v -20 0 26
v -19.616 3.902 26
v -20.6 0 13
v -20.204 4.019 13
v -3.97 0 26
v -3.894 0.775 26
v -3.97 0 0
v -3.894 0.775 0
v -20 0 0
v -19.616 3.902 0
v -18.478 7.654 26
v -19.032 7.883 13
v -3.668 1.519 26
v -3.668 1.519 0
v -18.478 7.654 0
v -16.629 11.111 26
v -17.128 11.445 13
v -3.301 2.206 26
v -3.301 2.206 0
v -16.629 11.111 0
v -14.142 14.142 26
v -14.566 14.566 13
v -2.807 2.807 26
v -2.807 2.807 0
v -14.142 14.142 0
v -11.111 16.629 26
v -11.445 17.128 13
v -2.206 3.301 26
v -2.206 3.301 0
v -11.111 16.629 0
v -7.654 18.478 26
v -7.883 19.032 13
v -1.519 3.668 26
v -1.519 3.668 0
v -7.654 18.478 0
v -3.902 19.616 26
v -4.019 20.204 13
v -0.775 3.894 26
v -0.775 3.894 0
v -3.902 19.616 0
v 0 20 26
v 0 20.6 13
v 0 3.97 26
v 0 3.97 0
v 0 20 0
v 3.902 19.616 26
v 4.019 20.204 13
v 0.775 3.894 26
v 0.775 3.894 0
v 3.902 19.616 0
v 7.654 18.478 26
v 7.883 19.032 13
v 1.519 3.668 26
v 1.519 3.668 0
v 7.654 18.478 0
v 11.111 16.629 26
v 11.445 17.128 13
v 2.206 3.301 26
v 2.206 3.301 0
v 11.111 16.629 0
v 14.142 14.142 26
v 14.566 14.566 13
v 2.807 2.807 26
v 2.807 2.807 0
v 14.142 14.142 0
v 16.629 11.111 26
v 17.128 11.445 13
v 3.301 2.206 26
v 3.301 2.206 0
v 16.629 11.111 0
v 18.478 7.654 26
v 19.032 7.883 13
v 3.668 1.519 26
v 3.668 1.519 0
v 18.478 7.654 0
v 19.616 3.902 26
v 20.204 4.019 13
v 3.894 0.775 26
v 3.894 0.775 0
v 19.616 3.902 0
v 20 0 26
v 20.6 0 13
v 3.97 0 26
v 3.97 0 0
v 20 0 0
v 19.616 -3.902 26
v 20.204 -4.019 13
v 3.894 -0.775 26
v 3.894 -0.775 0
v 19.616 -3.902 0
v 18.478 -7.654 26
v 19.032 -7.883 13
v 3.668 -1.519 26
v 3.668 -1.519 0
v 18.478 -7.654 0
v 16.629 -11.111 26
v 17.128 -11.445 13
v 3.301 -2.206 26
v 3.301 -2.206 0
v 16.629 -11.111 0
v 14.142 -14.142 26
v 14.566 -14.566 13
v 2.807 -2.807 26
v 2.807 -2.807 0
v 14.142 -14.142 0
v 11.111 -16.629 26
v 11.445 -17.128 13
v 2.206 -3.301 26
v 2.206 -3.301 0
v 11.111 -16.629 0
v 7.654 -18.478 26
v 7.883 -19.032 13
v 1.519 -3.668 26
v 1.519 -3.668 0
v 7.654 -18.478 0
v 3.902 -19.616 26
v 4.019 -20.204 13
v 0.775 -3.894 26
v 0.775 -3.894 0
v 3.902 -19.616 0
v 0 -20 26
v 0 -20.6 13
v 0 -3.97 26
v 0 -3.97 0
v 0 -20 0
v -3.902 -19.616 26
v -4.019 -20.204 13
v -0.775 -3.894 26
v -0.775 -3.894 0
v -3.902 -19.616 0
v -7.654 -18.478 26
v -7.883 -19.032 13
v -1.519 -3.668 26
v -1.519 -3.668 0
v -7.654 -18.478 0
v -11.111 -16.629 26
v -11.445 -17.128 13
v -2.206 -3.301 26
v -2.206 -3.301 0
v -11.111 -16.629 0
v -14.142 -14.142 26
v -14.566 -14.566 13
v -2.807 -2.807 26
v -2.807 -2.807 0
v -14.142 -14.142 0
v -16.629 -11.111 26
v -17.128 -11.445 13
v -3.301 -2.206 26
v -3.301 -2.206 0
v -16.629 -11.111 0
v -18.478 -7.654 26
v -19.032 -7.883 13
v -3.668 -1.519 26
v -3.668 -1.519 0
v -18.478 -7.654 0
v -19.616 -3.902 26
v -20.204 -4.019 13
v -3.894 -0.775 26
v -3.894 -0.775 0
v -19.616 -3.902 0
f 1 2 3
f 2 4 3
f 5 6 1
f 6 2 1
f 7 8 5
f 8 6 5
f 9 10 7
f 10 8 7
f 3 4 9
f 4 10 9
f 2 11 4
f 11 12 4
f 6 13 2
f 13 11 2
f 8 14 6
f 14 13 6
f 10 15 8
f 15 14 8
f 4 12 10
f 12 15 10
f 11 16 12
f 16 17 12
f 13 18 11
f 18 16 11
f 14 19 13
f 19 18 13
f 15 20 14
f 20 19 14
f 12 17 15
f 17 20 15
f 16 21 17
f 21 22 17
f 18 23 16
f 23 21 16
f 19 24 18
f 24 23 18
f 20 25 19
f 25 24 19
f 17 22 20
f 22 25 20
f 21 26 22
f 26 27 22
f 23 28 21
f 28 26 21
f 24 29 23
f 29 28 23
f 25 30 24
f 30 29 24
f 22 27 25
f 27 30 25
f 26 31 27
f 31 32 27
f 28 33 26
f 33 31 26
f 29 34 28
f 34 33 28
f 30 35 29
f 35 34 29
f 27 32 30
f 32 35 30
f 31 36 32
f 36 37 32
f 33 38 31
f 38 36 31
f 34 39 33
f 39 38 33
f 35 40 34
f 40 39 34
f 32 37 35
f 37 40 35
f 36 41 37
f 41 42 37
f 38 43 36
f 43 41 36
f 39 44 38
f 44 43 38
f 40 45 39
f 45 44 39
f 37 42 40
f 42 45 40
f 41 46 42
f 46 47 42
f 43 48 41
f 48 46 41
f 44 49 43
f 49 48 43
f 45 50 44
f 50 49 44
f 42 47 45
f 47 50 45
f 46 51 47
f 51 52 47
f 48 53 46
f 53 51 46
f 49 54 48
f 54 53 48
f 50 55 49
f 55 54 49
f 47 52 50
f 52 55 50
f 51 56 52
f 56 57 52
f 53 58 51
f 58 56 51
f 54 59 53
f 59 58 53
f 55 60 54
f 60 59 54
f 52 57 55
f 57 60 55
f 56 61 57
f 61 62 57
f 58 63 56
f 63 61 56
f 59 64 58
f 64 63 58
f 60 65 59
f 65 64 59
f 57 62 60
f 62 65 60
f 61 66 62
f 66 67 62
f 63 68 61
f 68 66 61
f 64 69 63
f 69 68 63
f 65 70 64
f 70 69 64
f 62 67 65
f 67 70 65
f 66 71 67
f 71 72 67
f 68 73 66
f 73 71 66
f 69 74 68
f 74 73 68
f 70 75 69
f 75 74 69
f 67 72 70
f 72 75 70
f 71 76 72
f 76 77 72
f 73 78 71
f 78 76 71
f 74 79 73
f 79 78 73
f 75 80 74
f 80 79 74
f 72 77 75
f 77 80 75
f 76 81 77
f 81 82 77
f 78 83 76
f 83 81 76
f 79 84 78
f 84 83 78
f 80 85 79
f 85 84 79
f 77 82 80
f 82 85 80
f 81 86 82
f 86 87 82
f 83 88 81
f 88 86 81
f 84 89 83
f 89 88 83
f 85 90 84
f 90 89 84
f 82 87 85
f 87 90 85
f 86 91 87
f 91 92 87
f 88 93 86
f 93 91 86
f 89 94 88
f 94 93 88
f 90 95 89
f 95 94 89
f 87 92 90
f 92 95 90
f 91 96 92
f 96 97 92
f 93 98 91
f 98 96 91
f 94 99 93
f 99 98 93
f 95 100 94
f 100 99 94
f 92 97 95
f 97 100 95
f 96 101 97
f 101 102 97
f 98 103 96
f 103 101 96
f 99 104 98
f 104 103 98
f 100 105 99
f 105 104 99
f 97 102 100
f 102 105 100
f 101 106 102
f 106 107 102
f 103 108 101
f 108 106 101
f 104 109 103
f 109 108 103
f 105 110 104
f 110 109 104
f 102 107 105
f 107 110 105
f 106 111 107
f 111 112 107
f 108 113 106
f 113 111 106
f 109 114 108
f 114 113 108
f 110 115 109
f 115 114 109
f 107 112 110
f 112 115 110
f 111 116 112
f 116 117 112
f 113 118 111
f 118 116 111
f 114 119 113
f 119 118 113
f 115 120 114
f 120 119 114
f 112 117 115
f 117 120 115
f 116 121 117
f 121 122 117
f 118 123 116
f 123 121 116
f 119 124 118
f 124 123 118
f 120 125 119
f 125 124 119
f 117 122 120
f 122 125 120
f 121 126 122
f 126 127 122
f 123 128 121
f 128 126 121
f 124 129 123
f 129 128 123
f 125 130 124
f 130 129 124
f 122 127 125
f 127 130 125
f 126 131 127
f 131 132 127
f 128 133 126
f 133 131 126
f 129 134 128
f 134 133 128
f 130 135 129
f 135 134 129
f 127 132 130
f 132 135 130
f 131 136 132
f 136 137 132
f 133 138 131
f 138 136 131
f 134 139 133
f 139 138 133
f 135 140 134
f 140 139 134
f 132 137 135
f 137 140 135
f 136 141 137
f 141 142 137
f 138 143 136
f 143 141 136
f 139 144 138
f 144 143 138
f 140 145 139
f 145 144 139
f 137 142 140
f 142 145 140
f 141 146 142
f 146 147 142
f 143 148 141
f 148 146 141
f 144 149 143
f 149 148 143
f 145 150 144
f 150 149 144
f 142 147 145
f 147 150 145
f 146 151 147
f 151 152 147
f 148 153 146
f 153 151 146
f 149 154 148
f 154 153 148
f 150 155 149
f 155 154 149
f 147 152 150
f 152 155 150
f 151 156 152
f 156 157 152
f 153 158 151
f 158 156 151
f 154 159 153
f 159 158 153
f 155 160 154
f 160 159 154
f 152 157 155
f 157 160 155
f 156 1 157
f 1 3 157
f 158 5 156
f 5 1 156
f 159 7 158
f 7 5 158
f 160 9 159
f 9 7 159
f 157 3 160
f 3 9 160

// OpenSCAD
$fn = 32;

// ----------------------------------------------------------------------
// Belt roller: 40 mm barrel, 26 mm wide, bore 7.94 mm
// ----------------------------------------------------------------------

// --- parameters (mm) ---
bore_d = 7.94;            // bore
barrel_d = 40;            // barrel diameter
roller_w = 26;            // roller width
crown = 0.6;              // crown height at mid width

roller_profile = [[3.97, 0], [20, 0], [20.6, 13], [20, 26], [3.97, 26]];

/* the profile stays clear of the axis, so the bore comes out of the revolve */
rotate_extrude() polygon(roller_profile);
